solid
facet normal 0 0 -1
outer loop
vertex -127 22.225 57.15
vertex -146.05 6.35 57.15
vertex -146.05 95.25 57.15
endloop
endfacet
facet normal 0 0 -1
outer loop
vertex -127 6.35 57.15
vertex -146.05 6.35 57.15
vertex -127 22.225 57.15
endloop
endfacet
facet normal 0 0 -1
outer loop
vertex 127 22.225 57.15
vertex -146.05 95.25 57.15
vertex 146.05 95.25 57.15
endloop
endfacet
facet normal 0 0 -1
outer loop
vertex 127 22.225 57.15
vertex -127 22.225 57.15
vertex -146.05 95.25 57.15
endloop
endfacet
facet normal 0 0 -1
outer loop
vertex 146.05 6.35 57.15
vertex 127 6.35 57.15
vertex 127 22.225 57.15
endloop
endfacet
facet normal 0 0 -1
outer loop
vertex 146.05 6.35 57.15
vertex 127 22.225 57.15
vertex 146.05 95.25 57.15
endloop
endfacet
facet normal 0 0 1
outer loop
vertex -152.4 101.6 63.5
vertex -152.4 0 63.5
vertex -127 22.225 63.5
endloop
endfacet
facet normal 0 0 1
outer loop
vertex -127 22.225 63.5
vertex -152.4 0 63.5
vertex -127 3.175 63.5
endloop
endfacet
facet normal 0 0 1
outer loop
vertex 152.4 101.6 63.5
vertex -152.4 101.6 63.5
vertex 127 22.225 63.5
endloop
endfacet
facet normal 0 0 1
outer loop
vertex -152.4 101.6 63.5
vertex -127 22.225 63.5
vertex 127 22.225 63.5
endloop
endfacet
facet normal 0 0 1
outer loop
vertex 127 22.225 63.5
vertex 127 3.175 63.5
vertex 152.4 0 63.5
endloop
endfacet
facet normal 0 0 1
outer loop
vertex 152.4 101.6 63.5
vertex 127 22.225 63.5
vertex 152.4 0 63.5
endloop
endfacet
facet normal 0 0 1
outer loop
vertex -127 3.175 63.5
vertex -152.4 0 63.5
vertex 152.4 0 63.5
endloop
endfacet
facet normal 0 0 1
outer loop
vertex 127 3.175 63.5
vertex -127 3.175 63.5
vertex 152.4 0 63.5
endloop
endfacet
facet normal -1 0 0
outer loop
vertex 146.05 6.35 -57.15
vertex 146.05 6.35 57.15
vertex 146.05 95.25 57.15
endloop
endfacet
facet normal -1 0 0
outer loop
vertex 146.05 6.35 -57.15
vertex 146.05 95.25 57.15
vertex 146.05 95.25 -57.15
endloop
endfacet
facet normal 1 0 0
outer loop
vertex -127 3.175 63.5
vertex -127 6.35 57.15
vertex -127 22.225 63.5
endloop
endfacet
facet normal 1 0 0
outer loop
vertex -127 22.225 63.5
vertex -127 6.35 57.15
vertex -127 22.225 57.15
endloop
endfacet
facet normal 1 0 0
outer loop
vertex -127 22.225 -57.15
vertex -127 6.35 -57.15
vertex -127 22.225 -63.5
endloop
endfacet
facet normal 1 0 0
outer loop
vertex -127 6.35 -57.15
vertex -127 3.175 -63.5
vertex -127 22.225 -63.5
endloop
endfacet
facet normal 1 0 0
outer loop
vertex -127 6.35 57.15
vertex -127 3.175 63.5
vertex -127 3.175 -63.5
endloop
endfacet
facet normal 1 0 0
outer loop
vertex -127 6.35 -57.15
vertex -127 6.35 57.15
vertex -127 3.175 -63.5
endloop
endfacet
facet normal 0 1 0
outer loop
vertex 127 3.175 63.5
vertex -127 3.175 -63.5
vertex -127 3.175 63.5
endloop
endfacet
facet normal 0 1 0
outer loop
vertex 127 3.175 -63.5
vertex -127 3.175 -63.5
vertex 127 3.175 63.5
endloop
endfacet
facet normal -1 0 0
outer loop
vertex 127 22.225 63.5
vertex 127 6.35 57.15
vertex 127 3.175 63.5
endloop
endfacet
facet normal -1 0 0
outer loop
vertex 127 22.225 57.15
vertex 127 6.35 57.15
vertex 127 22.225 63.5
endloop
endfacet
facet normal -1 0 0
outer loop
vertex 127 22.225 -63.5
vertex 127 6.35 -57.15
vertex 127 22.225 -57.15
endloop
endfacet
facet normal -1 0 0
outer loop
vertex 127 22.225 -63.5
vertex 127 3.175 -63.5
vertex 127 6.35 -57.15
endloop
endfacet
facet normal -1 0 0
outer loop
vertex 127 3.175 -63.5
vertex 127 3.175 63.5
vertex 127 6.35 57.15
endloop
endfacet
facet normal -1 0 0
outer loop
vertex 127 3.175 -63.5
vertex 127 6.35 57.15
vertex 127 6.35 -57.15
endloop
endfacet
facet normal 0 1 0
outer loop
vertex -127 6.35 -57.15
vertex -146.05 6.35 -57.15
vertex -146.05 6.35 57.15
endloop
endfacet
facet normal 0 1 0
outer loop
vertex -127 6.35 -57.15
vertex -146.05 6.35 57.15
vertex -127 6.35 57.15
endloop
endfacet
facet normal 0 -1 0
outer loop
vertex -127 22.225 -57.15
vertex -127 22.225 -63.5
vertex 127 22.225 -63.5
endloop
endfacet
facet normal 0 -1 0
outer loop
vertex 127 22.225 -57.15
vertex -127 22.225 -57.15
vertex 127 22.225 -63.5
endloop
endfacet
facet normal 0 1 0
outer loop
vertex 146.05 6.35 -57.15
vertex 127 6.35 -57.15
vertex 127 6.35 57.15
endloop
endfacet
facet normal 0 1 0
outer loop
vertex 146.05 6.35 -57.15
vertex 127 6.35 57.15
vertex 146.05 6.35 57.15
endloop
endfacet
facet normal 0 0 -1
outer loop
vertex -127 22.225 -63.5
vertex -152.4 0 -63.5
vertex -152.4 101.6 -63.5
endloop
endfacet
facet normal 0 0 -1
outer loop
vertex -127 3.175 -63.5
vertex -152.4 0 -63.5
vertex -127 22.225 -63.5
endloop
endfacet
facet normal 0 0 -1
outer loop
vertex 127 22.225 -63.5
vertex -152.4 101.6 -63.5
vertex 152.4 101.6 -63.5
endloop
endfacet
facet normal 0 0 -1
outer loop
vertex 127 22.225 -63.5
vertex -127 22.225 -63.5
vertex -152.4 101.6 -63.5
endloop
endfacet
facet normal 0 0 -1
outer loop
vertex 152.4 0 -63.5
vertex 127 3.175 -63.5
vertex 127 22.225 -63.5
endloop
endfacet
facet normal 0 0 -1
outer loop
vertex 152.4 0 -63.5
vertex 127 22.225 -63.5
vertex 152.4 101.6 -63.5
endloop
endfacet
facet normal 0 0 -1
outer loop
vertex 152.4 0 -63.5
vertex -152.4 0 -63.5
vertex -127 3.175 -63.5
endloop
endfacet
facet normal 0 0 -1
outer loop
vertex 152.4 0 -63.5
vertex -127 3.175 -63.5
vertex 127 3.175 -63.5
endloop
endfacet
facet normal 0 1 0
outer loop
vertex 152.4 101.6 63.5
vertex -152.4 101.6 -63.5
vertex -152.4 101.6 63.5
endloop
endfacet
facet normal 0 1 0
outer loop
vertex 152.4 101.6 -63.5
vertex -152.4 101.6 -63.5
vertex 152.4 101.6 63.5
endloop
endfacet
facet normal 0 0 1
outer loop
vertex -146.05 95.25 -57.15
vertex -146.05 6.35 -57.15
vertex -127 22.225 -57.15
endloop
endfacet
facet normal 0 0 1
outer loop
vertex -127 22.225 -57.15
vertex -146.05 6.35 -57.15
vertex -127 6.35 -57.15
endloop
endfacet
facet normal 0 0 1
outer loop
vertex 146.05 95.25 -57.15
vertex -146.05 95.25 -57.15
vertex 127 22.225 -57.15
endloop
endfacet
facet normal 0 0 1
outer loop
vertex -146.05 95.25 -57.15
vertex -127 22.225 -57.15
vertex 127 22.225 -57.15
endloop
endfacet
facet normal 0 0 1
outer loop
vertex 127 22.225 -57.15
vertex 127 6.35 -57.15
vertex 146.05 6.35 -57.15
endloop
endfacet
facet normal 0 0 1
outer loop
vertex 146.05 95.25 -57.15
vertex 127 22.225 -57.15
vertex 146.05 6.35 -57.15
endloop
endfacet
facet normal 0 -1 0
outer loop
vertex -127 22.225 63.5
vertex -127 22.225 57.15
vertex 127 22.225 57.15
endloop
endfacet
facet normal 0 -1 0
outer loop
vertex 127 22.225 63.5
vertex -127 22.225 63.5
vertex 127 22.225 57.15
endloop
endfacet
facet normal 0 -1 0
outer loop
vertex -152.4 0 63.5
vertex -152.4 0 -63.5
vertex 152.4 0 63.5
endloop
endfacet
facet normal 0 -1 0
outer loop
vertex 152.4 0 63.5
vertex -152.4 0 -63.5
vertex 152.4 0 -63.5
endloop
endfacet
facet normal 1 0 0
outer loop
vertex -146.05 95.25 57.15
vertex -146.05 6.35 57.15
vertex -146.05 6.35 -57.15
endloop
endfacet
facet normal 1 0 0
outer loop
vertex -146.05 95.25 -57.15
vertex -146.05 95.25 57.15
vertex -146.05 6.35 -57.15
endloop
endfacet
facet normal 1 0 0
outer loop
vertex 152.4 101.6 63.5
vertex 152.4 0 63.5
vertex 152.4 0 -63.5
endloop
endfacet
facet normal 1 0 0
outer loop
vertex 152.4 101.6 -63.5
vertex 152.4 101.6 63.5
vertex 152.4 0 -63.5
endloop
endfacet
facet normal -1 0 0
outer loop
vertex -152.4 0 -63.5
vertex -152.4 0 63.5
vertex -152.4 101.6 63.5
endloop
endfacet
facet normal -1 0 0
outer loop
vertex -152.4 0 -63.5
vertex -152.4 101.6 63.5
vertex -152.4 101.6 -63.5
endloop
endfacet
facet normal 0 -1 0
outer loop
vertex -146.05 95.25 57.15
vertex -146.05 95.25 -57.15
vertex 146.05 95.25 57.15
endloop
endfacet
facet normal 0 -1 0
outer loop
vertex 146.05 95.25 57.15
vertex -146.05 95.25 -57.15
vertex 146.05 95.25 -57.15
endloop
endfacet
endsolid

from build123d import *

# Parameters (mm, degrees)
SKETCH1_W               = 304.8
SKETCH1_H               = 127
BOSS_EXTRUDE1_DEPTH     = 101.6
SHELL1_T                = 6.35
CUT_EXTRUDE1_DEPTH      = 223.88409544
CUT_EXTRUDE1_DEPTH_BACK = 223.88409544
SKETCH2_W               = 254
SKETCH2_H               = 19.05


with BuildPart() as part:
    # Sketch1 → Boss-Extrude1 (new body)
    with BuildSketch(Plane(origin=(0, 0, 0), x_dir=(1, 0, 0), z_dir=(0, 1, 0))):
        Rectangle(SKETCH1_W, SKETCH1_H)
    extrude(amount=BOSS_EXTRUDE1_DEPTH)

    # Shell1 (no face opened: a closed hollow body)
    add(offset(amount=-SHELL1_T, mode=Mode.PRIVATE), mode=Mode.SUBTRACT)

    # Sketch2 → Cut-Extrude1 (cut, two sides: drawn at the far end of the back side and taken through both)
    with BuildSketch(Plane.XY.offset(63.5).offset(-CUT_EXTRUDE1_DEPTH_BACK)):
        with Locations((0, 12.7)):
            Rectangle(SKETCH2_W, SKETCH2_H)
    extrude(amount=CUT_EXTRUDE1_DEPTH + CUT_EXTRUDE1_DEPTH_BACK, mode=Mode.SUBTRACT)


solid = part.part
